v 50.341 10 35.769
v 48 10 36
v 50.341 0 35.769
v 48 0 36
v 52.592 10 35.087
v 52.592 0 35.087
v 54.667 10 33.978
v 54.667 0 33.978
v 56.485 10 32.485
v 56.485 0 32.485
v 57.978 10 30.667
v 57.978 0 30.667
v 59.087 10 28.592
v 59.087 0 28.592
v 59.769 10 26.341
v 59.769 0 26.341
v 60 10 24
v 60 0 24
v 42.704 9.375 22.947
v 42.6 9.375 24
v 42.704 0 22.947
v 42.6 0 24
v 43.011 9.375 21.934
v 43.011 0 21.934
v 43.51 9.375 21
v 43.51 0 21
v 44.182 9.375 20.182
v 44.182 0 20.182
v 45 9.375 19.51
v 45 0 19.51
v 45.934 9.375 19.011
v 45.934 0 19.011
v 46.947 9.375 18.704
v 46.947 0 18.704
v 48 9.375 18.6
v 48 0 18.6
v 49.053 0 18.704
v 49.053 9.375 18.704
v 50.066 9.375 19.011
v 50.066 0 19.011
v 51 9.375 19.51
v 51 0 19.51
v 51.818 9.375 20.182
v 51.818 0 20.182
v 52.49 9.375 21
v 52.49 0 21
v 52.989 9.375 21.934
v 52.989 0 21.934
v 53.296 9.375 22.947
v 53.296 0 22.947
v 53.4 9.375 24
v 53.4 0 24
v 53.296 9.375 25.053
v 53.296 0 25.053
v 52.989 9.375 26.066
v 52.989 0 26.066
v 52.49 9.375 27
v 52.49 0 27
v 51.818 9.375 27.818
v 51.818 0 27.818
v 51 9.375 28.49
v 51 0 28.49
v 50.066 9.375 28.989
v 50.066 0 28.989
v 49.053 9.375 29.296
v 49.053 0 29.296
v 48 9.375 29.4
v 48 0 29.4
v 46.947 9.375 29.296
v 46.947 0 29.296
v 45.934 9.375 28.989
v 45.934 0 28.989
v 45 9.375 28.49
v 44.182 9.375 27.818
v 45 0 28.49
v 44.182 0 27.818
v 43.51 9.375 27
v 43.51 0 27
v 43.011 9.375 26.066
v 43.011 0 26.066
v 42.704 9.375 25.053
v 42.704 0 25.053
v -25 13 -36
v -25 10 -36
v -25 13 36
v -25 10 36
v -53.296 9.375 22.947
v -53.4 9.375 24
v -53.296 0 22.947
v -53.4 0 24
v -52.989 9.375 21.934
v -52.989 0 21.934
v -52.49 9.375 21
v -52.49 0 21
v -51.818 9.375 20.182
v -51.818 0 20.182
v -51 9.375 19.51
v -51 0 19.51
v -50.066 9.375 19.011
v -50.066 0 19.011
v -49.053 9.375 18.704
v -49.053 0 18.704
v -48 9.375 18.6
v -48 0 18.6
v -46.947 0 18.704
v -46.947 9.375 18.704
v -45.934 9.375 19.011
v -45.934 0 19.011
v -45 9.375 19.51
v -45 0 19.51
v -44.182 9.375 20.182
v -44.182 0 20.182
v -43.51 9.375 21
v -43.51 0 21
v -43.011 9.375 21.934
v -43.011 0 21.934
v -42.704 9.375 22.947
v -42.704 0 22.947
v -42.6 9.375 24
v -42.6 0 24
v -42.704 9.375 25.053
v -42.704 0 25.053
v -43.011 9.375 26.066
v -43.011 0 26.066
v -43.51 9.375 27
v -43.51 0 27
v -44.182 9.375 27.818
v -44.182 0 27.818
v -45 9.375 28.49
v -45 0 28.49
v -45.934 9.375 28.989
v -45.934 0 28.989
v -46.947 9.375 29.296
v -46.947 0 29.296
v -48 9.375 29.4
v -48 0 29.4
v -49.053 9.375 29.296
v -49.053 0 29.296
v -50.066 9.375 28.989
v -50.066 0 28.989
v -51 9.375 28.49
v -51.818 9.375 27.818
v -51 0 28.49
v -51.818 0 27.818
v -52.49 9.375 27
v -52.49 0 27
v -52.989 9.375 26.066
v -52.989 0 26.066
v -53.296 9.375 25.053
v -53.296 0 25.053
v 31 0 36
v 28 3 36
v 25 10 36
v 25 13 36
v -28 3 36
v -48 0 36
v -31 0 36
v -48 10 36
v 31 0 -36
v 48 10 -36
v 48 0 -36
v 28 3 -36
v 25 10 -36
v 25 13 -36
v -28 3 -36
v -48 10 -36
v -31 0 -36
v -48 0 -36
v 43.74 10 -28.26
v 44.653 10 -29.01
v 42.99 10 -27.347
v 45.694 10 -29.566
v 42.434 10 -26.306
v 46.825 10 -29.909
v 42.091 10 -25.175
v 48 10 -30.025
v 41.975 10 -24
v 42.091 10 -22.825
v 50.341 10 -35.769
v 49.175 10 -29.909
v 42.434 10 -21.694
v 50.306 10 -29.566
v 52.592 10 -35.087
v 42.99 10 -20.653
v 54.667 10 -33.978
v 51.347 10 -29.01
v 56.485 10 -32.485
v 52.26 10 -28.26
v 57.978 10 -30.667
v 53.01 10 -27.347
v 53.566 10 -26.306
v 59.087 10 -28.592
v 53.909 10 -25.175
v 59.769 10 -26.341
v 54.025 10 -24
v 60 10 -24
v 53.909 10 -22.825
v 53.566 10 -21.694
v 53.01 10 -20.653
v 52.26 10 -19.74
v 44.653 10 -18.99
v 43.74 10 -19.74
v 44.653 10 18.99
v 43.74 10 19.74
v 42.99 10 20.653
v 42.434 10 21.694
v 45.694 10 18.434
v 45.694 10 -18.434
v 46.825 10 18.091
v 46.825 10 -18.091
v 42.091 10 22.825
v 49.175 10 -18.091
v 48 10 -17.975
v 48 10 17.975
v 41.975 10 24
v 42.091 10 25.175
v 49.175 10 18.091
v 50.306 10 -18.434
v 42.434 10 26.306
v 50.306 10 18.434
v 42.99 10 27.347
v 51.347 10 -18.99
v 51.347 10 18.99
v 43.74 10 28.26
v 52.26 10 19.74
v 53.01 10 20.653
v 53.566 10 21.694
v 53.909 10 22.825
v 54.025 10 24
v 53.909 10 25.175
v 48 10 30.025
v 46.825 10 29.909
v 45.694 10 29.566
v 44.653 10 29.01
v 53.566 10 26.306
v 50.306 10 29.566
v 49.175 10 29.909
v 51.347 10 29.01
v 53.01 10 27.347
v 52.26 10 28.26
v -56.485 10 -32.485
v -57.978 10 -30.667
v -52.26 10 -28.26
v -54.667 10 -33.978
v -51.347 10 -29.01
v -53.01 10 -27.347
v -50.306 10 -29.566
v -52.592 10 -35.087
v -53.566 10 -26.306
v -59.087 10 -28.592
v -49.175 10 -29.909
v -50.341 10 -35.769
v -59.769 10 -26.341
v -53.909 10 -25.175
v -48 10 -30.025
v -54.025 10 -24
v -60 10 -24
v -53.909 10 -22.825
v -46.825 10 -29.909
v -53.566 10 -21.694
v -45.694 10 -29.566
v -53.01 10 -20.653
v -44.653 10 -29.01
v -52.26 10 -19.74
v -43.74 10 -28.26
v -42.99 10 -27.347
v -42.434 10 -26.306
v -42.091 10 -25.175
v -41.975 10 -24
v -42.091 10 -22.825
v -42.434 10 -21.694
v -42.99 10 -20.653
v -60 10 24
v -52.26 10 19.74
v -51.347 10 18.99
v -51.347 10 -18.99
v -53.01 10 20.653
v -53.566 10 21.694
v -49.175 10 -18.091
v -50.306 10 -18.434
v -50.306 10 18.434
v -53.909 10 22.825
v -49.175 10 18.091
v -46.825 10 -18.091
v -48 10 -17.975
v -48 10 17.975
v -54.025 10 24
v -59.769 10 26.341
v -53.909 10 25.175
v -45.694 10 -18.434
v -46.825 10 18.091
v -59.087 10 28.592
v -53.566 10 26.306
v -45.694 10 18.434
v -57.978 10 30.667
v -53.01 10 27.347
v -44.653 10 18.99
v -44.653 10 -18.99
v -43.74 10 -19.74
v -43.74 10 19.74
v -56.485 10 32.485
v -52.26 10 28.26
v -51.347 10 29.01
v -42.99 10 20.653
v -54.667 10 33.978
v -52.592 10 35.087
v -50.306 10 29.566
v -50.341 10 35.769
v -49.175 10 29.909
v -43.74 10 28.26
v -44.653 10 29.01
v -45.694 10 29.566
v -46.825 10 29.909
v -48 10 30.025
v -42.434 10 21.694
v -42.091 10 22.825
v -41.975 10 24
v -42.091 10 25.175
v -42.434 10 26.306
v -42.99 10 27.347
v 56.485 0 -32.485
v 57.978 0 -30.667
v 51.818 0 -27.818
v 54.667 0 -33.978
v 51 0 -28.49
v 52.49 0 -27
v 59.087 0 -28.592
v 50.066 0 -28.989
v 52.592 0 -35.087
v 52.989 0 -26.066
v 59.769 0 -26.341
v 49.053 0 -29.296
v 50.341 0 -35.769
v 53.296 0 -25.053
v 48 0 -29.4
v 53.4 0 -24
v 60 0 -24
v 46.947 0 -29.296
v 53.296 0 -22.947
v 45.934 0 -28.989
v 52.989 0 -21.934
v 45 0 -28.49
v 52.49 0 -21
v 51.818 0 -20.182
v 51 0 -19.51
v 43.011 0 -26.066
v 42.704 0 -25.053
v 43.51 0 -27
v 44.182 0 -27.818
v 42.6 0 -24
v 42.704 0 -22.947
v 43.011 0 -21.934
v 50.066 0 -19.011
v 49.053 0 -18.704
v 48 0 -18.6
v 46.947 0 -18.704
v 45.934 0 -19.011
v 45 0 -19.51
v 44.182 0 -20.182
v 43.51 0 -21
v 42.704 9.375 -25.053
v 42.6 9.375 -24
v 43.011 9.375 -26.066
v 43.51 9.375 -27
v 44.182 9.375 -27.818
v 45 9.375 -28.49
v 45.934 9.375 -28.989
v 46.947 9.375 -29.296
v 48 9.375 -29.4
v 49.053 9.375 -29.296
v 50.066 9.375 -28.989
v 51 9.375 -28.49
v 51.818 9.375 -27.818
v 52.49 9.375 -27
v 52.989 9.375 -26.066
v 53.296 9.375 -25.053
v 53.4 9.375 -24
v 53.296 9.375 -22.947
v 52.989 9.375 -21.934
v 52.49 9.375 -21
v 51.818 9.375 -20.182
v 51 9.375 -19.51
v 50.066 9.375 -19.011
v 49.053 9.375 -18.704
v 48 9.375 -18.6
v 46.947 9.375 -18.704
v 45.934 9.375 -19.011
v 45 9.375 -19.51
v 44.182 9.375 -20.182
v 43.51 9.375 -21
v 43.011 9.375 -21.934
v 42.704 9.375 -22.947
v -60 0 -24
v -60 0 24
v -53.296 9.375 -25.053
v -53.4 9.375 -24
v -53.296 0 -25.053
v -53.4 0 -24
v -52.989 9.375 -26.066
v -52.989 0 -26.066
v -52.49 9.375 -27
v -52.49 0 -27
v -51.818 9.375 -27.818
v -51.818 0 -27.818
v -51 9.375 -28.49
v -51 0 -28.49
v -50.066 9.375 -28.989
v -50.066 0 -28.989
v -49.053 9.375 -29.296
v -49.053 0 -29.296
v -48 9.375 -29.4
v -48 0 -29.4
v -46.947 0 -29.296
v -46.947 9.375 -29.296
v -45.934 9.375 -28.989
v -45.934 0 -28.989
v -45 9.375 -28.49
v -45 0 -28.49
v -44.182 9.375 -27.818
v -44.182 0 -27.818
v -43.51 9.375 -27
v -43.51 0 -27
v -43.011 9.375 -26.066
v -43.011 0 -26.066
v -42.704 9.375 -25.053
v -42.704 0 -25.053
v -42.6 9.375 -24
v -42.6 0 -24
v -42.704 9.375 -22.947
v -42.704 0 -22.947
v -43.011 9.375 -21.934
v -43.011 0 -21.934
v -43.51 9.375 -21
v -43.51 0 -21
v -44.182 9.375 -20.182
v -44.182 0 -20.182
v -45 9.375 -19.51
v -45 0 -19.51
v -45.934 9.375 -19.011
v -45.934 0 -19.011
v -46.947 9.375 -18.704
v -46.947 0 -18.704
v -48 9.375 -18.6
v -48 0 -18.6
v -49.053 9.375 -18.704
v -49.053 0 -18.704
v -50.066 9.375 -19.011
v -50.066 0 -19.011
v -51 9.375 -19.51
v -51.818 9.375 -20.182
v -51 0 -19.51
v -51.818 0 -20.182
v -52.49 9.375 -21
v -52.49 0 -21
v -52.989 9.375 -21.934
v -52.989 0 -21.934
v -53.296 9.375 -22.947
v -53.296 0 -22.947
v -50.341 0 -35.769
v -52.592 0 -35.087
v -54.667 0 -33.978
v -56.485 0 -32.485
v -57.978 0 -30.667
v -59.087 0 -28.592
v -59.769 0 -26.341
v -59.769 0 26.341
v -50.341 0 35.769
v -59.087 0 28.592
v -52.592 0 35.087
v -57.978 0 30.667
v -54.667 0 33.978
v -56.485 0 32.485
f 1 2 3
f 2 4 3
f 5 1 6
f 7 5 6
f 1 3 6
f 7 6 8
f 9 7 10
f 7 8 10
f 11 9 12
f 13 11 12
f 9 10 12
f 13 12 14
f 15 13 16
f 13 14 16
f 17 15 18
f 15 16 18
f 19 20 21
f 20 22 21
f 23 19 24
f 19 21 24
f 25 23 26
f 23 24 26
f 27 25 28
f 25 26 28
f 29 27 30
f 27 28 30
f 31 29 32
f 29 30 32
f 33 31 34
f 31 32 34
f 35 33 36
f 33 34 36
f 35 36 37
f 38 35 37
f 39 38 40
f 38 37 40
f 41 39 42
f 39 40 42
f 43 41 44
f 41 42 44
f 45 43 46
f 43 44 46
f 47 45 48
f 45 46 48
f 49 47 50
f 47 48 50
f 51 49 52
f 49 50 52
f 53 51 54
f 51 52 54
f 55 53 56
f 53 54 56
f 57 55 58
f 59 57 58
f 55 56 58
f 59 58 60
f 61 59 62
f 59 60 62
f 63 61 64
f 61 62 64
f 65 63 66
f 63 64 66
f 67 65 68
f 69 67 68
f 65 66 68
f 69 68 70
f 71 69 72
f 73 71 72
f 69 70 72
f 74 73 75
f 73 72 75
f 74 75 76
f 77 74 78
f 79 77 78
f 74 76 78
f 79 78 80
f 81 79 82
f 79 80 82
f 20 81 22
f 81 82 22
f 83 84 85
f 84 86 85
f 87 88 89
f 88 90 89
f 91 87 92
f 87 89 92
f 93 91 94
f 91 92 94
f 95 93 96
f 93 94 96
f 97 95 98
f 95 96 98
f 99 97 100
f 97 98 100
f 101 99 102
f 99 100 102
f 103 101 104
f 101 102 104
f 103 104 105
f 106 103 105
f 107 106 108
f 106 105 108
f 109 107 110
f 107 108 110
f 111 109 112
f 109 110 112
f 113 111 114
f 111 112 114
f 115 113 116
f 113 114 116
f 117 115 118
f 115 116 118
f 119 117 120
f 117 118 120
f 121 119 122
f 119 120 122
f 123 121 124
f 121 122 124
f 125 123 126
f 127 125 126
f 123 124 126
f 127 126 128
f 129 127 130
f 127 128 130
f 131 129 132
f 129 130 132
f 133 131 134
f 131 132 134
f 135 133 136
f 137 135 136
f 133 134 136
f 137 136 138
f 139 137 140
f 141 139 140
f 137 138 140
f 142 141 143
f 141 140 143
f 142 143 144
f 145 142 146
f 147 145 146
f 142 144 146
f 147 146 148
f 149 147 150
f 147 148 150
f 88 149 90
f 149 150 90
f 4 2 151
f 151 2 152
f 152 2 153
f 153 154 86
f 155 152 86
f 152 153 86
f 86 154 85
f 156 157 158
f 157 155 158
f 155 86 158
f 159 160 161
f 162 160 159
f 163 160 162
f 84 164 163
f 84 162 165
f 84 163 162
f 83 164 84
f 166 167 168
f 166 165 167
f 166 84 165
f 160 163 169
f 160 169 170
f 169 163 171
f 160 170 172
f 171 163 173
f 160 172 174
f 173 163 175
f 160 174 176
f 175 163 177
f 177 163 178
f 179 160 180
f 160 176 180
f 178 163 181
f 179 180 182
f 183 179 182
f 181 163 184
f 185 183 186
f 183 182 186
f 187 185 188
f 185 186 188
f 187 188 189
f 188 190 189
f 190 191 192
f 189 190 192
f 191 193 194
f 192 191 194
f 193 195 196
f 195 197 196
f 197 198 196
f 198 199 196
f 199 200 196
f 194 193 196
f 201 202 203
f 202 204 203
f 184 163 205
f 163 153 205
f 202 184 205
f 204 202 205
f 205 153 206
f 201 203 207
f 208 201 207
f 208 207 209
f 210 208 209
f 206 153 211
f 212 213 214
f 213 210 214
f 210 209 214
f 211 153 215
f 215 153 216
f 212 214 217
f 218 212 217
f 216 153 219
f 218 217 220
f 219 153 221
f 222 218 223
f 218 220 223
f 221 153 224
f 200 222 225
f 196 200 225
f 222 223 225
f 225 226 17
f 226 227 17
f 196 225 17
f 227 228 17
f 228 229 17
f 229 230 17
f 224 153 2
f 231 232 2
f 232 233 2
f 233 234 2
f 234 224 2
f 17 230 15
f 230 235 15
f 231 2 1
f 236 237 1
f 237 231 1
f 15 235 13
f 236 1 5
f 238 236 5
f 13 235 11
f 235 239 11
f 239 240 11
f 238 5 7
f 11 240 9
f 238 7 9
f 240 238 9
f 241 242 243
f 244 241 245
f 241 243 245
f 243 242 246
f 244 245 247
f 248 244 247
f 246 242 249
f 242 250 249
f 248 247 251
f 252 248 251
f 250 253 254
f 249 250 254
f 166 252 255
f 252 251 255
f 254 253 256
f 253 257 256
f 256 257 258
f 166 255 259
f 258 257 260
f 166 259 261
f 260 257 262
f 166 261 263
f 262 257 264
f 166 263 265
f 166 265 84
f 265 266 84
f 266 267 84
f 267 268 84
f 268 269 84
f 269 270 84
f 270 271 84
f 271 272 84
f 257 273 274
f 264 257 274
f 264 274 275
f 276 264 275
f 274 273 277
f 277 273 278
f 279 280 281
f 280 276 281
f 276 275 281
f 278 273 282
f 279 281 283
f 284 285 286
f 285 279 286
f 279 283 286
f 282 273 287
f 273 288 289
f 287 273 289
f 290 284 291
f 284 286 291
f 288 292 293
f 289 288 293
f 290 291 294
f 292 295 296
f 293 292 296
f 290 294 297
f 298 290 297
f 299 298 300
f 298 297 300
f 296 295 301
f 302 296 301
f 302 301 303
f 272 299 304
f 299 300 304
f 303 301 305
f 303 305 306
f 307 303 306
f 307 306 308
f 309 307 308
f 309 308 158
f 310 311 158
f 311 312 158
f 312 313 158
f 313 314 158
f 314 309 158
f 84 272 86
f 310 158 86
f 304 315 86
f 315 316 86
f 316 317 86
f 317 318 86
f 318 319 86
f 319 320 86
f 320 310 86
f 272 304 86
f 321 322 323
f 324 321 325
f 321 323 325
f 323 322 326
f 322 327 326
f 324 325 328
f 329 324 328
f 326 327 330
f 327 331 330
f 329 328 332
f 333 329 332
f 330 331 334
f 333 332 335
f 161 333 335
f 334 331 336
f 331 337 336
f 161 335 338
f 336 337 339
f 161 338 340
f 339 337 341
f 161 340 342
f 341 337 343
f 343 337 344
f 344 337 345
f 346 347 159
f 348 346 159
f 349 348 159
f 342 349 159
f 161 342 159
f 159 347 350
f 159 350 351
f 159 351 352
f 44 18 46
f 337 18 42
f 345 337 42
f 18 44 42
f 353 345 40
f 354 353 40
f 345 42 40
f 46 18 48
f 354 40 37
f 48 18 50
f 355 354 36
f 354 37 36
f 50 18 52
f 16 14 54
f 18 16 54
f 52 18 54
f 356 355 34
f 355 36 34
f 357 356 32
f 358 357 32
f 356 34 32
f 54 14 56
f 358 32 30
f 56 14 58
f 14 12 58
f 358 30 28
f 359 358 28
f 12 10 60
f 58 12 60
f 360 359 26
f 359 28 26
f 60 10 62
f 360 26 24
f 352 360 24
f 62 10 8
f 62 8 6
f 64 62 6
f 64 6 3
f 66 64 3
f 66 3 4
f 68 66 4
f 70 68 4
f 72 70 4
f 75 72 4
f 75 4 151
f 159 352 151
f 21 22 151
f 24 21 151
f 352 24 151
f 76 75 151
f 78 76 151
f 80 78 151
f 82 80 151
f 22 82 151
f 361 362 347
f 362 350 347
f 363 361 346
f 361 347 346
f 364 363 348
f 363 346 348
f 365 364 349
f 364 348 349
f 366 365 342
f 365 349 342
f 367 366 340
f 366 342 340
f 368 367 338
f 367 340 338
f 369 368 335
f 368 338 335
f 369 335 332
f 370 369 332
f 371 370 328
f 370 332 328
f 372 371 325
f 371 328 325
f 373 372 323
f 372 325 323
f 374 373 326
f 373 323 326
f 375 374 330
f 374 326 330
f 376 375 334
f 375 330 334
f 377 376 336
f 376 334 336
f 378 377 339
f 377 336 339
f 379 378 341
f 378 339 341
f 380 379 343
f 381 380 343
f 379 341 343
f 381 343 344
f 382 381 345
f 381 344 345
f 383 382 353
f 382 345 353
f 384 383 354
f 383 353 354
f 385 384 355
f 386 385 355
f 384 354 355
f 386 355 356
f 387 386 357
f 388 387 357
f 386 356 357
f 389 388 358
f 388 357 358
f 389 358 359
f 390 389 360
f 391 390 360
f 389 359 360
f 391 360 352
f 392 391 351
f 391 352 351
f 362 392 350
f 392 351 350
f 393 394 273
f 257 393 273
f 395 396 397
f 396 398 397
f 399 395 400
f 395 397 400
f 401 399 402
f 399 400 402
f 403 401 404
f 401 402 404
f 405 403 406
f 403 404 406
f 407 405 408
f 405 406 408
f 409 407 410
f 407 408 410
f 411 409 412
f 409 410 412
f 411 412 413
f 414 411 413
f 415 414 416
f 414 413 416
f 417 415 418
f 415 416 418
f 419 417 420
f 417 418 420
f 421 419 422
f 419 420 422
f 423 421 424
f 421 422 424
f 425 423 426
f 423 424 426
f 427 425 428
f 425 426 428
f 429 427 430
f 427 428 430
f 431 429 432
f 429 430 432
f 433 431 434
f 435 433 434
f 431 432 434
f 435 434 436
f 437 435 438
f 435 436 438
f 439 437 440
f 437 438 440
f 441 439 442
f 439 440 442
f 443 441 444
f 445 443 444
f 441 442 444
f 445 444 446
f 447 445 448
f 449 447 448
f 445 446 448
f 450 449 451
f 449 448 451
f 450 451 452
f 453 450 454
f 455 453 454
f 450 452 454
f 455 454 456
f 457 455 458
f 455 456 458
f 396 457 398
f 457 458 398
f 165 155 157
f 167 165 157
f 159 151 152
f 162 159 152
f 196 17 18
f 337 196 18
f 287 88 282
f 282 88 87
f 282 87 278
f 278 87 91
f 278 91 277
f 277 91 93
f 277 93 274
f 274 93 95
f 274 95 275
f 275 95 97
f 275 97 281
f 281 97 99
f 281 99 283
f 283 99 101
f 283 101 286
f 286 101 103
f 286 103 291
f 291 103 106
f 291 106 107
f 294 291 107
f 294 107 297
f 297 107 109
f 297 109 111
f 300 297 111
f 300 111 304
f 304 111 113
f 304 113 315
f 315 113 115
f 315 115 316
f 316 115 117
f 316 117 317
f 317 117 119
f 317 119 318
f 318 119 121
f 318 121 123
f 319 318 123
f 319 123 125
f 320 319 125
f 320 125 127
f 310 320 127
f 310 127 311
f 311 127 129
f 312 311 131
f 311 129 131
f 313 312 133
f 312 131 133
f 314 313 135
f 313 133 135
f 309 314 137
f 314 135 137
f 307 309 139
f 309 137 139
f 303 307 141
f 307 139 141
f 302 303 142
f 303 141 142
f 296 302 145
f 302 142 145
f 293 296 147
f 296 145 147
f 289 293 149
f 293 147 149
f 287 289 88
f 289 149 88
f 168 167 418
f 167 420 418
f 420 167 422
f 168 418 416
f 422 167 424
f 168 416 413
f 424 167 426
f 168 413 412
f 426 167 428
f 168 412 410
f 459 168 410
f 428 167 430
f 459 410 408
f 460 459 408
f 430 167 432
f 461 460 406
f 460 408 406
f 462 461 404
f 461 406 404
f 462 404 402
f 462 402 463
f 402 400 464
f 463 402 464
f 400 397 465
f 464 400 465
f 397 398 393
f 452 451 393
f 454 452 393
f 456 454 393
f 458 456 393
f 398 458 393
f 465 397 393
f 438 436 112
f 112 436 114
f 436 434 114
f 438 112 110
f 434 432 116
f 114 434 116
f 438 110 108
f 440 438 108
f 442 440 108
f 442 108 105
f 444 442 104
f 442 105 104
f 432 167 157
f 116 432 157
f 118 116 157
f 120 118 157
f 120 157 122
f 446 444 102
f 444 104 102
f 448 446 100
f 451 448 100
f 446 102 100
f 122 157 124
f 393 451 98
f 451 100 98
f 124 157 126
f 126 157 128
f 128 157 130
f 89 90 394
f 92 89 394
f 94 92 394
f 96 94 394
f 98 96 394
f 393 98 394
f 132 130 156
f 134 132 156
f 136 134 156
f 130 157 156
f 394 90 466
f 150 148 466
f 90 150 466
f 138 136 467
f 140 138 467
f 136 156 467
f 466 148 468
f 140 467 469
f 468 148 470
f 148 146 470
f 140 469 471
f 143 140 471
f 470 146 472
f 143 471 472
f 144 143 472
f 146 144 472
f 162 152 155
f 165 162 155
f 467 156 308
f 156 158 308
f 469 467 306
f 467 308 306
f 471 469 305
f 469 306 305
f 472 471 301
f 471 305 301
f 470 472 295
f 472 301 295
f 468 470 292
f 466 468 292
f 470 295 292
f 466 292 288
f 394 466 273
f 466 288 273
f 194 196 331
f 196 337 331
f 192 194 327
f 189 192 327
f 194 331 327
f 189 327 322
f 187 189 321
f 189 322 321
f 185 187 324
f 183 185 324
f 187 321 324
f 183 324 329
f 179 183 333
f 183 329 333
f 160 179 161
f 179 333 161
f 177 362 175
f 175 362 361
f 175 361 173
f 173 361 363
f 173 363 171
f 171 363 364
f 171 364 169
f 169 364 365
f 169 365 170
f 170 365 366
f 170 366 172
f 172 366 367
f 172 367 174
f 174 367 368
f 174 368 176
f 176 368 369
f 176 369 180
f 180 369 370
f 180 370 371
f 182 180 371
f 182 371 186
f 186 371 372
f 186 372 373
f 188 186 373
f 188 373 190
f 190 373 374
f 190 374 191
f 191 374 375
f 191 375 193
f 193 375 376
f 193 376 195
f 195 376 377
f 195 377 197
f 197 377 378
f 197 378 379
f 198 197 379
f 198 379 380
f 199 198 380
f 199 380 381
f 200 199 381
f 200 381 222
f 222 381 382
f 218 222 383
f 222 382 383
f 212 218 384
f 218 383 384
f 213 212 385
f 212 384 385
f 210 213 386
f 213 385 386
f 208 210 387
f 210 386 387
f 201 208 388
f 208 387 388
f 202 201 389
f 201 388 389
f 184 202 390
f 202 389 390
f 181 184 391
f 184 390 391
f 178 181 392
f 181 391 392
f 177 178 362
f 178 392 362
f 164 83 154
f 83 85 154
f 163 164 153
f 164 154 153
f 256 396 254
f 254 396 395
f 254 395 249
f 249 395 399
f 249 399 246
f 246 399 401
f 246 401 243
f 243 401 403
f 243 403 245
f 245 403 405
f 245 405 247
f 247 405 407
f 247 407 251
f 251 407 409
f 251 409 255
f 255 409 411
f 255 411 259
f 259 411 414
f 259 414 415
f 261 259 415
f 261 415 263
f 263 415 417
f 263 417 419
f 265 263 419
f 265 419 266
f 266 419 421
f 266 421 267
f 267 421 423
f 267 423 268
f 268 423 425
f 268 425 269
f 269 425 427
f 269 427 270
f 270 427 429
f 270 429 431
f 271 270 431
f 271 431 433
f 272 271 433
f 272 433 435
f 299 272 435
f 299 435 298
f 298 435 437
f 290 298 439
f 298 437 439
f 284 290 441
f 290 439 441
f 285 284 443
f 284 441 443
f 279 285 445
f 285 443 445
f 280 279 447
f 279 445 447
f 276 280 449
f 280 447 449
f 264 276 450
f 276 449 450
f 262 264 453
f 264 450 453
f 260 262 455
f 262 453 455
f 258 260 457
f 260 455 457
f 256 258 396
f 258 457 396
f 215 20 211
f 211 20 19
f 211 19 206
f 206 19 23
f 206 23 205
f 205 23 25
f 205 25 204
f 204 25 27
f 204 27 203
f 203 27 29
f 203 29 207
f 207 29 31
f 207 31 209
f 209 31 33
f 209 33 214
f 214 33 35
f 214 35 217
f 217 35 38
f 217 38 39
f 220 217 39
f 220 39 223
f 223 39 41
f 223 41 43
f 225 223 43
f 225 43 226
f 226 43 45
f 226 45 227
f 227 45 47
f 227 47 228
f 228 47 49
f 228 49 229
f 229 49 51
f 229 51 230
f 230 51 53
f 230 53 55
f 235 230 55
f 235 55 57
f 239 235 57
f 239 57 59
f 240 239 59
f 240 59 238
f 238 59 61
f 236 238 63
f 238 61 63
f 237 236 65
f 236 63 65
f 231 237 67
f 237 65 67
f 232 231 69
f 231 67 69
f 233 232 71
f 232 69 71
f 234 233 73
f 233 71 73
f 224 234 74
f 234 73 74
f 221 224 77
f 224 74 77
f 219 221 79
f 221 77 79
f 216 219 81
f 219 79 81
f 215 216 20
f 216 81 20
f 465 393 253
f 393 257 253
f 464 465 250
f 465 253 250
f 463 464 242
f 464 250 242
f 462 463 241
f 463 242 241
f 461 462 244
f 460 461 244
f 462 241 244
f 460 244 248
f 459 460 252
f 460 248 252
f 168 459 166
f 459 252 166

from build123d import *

# Parameters (mm, degrees)
BOSS_EXTRUDE1_DEPTH               = 36
FILLET1_R                         = 12
M12X1_25_TAPPED_HOLE1_D           = 10.8
M12X1_25_TAPPED_HOLE1_DEPTH       = 24.505352657
M12X1_25_TAPPED_HOLE1_CSINK_D     = 12.05
M12X1_25_TAPPED_HOLE1_CSINK_ANGLE = 90
M12X1_25_TAPPED_HOLE1_TIP         = 3.244647343


with BuildPart() as part:
    # Sketch1 → Boss-Extrude1 (new, symmetric)
    with BuildSketch(Plane.XY):
        Polygon((-28, 3), (-31, 0), (-60, 0), (-60, 10), (-25, 10), (-25, 13), (25, 13), (25, 10), (60, 10), (60, 0), (31, 0), (28, 3), align=None)
    extrude(amount=BOSS_EXTRUDE1_DEPTH, both=True)

    # Fillet1
    fillet1_edges = [part.edges().sort_by_distance(p)[0] for p in [
        (-60, 5, -36),
        (60, 5, -36),
        (60, 5, 36),
        (-60, 5, 36),
    ]]
    fillet(fillet1_edges, radius=FILLET1_R)

    # M12x1.25 Tapped Hole1
    with Locations(Plane(origin=(0, 10, 0), x_dir=(1, 0, 0), z_dir=(0, 1, 0))):
        with Locations((-48, 24), (-48, -24), (48, -24), (48, 24)):
            CounterSinkHole(M12X1_25_TAPPED_HOLE1_D / 2, M12X1_25_TAPPED_HOLE1_CSINK_D / 2, depth=M12X1_25_TAPPED_HOLE1_DEPTH, counter_sink_angle=M12X1_25_TAPPED_HOLE1_CSINK_ANGLE)
            with Locations((0, 0, -(M12X1_25_TAPPED_HOLE1_DEPTH + M12X1_25_TAPPED_HOLE1_TIP / 2))):  # 118° drill point
                Cone(0, M12X1_25_TAPPED_HOLE1_D / 2, M12X1_25_TAPPED_HOLE1_TIP, mode=Mode.SUBTRACT)


solid = part.part
